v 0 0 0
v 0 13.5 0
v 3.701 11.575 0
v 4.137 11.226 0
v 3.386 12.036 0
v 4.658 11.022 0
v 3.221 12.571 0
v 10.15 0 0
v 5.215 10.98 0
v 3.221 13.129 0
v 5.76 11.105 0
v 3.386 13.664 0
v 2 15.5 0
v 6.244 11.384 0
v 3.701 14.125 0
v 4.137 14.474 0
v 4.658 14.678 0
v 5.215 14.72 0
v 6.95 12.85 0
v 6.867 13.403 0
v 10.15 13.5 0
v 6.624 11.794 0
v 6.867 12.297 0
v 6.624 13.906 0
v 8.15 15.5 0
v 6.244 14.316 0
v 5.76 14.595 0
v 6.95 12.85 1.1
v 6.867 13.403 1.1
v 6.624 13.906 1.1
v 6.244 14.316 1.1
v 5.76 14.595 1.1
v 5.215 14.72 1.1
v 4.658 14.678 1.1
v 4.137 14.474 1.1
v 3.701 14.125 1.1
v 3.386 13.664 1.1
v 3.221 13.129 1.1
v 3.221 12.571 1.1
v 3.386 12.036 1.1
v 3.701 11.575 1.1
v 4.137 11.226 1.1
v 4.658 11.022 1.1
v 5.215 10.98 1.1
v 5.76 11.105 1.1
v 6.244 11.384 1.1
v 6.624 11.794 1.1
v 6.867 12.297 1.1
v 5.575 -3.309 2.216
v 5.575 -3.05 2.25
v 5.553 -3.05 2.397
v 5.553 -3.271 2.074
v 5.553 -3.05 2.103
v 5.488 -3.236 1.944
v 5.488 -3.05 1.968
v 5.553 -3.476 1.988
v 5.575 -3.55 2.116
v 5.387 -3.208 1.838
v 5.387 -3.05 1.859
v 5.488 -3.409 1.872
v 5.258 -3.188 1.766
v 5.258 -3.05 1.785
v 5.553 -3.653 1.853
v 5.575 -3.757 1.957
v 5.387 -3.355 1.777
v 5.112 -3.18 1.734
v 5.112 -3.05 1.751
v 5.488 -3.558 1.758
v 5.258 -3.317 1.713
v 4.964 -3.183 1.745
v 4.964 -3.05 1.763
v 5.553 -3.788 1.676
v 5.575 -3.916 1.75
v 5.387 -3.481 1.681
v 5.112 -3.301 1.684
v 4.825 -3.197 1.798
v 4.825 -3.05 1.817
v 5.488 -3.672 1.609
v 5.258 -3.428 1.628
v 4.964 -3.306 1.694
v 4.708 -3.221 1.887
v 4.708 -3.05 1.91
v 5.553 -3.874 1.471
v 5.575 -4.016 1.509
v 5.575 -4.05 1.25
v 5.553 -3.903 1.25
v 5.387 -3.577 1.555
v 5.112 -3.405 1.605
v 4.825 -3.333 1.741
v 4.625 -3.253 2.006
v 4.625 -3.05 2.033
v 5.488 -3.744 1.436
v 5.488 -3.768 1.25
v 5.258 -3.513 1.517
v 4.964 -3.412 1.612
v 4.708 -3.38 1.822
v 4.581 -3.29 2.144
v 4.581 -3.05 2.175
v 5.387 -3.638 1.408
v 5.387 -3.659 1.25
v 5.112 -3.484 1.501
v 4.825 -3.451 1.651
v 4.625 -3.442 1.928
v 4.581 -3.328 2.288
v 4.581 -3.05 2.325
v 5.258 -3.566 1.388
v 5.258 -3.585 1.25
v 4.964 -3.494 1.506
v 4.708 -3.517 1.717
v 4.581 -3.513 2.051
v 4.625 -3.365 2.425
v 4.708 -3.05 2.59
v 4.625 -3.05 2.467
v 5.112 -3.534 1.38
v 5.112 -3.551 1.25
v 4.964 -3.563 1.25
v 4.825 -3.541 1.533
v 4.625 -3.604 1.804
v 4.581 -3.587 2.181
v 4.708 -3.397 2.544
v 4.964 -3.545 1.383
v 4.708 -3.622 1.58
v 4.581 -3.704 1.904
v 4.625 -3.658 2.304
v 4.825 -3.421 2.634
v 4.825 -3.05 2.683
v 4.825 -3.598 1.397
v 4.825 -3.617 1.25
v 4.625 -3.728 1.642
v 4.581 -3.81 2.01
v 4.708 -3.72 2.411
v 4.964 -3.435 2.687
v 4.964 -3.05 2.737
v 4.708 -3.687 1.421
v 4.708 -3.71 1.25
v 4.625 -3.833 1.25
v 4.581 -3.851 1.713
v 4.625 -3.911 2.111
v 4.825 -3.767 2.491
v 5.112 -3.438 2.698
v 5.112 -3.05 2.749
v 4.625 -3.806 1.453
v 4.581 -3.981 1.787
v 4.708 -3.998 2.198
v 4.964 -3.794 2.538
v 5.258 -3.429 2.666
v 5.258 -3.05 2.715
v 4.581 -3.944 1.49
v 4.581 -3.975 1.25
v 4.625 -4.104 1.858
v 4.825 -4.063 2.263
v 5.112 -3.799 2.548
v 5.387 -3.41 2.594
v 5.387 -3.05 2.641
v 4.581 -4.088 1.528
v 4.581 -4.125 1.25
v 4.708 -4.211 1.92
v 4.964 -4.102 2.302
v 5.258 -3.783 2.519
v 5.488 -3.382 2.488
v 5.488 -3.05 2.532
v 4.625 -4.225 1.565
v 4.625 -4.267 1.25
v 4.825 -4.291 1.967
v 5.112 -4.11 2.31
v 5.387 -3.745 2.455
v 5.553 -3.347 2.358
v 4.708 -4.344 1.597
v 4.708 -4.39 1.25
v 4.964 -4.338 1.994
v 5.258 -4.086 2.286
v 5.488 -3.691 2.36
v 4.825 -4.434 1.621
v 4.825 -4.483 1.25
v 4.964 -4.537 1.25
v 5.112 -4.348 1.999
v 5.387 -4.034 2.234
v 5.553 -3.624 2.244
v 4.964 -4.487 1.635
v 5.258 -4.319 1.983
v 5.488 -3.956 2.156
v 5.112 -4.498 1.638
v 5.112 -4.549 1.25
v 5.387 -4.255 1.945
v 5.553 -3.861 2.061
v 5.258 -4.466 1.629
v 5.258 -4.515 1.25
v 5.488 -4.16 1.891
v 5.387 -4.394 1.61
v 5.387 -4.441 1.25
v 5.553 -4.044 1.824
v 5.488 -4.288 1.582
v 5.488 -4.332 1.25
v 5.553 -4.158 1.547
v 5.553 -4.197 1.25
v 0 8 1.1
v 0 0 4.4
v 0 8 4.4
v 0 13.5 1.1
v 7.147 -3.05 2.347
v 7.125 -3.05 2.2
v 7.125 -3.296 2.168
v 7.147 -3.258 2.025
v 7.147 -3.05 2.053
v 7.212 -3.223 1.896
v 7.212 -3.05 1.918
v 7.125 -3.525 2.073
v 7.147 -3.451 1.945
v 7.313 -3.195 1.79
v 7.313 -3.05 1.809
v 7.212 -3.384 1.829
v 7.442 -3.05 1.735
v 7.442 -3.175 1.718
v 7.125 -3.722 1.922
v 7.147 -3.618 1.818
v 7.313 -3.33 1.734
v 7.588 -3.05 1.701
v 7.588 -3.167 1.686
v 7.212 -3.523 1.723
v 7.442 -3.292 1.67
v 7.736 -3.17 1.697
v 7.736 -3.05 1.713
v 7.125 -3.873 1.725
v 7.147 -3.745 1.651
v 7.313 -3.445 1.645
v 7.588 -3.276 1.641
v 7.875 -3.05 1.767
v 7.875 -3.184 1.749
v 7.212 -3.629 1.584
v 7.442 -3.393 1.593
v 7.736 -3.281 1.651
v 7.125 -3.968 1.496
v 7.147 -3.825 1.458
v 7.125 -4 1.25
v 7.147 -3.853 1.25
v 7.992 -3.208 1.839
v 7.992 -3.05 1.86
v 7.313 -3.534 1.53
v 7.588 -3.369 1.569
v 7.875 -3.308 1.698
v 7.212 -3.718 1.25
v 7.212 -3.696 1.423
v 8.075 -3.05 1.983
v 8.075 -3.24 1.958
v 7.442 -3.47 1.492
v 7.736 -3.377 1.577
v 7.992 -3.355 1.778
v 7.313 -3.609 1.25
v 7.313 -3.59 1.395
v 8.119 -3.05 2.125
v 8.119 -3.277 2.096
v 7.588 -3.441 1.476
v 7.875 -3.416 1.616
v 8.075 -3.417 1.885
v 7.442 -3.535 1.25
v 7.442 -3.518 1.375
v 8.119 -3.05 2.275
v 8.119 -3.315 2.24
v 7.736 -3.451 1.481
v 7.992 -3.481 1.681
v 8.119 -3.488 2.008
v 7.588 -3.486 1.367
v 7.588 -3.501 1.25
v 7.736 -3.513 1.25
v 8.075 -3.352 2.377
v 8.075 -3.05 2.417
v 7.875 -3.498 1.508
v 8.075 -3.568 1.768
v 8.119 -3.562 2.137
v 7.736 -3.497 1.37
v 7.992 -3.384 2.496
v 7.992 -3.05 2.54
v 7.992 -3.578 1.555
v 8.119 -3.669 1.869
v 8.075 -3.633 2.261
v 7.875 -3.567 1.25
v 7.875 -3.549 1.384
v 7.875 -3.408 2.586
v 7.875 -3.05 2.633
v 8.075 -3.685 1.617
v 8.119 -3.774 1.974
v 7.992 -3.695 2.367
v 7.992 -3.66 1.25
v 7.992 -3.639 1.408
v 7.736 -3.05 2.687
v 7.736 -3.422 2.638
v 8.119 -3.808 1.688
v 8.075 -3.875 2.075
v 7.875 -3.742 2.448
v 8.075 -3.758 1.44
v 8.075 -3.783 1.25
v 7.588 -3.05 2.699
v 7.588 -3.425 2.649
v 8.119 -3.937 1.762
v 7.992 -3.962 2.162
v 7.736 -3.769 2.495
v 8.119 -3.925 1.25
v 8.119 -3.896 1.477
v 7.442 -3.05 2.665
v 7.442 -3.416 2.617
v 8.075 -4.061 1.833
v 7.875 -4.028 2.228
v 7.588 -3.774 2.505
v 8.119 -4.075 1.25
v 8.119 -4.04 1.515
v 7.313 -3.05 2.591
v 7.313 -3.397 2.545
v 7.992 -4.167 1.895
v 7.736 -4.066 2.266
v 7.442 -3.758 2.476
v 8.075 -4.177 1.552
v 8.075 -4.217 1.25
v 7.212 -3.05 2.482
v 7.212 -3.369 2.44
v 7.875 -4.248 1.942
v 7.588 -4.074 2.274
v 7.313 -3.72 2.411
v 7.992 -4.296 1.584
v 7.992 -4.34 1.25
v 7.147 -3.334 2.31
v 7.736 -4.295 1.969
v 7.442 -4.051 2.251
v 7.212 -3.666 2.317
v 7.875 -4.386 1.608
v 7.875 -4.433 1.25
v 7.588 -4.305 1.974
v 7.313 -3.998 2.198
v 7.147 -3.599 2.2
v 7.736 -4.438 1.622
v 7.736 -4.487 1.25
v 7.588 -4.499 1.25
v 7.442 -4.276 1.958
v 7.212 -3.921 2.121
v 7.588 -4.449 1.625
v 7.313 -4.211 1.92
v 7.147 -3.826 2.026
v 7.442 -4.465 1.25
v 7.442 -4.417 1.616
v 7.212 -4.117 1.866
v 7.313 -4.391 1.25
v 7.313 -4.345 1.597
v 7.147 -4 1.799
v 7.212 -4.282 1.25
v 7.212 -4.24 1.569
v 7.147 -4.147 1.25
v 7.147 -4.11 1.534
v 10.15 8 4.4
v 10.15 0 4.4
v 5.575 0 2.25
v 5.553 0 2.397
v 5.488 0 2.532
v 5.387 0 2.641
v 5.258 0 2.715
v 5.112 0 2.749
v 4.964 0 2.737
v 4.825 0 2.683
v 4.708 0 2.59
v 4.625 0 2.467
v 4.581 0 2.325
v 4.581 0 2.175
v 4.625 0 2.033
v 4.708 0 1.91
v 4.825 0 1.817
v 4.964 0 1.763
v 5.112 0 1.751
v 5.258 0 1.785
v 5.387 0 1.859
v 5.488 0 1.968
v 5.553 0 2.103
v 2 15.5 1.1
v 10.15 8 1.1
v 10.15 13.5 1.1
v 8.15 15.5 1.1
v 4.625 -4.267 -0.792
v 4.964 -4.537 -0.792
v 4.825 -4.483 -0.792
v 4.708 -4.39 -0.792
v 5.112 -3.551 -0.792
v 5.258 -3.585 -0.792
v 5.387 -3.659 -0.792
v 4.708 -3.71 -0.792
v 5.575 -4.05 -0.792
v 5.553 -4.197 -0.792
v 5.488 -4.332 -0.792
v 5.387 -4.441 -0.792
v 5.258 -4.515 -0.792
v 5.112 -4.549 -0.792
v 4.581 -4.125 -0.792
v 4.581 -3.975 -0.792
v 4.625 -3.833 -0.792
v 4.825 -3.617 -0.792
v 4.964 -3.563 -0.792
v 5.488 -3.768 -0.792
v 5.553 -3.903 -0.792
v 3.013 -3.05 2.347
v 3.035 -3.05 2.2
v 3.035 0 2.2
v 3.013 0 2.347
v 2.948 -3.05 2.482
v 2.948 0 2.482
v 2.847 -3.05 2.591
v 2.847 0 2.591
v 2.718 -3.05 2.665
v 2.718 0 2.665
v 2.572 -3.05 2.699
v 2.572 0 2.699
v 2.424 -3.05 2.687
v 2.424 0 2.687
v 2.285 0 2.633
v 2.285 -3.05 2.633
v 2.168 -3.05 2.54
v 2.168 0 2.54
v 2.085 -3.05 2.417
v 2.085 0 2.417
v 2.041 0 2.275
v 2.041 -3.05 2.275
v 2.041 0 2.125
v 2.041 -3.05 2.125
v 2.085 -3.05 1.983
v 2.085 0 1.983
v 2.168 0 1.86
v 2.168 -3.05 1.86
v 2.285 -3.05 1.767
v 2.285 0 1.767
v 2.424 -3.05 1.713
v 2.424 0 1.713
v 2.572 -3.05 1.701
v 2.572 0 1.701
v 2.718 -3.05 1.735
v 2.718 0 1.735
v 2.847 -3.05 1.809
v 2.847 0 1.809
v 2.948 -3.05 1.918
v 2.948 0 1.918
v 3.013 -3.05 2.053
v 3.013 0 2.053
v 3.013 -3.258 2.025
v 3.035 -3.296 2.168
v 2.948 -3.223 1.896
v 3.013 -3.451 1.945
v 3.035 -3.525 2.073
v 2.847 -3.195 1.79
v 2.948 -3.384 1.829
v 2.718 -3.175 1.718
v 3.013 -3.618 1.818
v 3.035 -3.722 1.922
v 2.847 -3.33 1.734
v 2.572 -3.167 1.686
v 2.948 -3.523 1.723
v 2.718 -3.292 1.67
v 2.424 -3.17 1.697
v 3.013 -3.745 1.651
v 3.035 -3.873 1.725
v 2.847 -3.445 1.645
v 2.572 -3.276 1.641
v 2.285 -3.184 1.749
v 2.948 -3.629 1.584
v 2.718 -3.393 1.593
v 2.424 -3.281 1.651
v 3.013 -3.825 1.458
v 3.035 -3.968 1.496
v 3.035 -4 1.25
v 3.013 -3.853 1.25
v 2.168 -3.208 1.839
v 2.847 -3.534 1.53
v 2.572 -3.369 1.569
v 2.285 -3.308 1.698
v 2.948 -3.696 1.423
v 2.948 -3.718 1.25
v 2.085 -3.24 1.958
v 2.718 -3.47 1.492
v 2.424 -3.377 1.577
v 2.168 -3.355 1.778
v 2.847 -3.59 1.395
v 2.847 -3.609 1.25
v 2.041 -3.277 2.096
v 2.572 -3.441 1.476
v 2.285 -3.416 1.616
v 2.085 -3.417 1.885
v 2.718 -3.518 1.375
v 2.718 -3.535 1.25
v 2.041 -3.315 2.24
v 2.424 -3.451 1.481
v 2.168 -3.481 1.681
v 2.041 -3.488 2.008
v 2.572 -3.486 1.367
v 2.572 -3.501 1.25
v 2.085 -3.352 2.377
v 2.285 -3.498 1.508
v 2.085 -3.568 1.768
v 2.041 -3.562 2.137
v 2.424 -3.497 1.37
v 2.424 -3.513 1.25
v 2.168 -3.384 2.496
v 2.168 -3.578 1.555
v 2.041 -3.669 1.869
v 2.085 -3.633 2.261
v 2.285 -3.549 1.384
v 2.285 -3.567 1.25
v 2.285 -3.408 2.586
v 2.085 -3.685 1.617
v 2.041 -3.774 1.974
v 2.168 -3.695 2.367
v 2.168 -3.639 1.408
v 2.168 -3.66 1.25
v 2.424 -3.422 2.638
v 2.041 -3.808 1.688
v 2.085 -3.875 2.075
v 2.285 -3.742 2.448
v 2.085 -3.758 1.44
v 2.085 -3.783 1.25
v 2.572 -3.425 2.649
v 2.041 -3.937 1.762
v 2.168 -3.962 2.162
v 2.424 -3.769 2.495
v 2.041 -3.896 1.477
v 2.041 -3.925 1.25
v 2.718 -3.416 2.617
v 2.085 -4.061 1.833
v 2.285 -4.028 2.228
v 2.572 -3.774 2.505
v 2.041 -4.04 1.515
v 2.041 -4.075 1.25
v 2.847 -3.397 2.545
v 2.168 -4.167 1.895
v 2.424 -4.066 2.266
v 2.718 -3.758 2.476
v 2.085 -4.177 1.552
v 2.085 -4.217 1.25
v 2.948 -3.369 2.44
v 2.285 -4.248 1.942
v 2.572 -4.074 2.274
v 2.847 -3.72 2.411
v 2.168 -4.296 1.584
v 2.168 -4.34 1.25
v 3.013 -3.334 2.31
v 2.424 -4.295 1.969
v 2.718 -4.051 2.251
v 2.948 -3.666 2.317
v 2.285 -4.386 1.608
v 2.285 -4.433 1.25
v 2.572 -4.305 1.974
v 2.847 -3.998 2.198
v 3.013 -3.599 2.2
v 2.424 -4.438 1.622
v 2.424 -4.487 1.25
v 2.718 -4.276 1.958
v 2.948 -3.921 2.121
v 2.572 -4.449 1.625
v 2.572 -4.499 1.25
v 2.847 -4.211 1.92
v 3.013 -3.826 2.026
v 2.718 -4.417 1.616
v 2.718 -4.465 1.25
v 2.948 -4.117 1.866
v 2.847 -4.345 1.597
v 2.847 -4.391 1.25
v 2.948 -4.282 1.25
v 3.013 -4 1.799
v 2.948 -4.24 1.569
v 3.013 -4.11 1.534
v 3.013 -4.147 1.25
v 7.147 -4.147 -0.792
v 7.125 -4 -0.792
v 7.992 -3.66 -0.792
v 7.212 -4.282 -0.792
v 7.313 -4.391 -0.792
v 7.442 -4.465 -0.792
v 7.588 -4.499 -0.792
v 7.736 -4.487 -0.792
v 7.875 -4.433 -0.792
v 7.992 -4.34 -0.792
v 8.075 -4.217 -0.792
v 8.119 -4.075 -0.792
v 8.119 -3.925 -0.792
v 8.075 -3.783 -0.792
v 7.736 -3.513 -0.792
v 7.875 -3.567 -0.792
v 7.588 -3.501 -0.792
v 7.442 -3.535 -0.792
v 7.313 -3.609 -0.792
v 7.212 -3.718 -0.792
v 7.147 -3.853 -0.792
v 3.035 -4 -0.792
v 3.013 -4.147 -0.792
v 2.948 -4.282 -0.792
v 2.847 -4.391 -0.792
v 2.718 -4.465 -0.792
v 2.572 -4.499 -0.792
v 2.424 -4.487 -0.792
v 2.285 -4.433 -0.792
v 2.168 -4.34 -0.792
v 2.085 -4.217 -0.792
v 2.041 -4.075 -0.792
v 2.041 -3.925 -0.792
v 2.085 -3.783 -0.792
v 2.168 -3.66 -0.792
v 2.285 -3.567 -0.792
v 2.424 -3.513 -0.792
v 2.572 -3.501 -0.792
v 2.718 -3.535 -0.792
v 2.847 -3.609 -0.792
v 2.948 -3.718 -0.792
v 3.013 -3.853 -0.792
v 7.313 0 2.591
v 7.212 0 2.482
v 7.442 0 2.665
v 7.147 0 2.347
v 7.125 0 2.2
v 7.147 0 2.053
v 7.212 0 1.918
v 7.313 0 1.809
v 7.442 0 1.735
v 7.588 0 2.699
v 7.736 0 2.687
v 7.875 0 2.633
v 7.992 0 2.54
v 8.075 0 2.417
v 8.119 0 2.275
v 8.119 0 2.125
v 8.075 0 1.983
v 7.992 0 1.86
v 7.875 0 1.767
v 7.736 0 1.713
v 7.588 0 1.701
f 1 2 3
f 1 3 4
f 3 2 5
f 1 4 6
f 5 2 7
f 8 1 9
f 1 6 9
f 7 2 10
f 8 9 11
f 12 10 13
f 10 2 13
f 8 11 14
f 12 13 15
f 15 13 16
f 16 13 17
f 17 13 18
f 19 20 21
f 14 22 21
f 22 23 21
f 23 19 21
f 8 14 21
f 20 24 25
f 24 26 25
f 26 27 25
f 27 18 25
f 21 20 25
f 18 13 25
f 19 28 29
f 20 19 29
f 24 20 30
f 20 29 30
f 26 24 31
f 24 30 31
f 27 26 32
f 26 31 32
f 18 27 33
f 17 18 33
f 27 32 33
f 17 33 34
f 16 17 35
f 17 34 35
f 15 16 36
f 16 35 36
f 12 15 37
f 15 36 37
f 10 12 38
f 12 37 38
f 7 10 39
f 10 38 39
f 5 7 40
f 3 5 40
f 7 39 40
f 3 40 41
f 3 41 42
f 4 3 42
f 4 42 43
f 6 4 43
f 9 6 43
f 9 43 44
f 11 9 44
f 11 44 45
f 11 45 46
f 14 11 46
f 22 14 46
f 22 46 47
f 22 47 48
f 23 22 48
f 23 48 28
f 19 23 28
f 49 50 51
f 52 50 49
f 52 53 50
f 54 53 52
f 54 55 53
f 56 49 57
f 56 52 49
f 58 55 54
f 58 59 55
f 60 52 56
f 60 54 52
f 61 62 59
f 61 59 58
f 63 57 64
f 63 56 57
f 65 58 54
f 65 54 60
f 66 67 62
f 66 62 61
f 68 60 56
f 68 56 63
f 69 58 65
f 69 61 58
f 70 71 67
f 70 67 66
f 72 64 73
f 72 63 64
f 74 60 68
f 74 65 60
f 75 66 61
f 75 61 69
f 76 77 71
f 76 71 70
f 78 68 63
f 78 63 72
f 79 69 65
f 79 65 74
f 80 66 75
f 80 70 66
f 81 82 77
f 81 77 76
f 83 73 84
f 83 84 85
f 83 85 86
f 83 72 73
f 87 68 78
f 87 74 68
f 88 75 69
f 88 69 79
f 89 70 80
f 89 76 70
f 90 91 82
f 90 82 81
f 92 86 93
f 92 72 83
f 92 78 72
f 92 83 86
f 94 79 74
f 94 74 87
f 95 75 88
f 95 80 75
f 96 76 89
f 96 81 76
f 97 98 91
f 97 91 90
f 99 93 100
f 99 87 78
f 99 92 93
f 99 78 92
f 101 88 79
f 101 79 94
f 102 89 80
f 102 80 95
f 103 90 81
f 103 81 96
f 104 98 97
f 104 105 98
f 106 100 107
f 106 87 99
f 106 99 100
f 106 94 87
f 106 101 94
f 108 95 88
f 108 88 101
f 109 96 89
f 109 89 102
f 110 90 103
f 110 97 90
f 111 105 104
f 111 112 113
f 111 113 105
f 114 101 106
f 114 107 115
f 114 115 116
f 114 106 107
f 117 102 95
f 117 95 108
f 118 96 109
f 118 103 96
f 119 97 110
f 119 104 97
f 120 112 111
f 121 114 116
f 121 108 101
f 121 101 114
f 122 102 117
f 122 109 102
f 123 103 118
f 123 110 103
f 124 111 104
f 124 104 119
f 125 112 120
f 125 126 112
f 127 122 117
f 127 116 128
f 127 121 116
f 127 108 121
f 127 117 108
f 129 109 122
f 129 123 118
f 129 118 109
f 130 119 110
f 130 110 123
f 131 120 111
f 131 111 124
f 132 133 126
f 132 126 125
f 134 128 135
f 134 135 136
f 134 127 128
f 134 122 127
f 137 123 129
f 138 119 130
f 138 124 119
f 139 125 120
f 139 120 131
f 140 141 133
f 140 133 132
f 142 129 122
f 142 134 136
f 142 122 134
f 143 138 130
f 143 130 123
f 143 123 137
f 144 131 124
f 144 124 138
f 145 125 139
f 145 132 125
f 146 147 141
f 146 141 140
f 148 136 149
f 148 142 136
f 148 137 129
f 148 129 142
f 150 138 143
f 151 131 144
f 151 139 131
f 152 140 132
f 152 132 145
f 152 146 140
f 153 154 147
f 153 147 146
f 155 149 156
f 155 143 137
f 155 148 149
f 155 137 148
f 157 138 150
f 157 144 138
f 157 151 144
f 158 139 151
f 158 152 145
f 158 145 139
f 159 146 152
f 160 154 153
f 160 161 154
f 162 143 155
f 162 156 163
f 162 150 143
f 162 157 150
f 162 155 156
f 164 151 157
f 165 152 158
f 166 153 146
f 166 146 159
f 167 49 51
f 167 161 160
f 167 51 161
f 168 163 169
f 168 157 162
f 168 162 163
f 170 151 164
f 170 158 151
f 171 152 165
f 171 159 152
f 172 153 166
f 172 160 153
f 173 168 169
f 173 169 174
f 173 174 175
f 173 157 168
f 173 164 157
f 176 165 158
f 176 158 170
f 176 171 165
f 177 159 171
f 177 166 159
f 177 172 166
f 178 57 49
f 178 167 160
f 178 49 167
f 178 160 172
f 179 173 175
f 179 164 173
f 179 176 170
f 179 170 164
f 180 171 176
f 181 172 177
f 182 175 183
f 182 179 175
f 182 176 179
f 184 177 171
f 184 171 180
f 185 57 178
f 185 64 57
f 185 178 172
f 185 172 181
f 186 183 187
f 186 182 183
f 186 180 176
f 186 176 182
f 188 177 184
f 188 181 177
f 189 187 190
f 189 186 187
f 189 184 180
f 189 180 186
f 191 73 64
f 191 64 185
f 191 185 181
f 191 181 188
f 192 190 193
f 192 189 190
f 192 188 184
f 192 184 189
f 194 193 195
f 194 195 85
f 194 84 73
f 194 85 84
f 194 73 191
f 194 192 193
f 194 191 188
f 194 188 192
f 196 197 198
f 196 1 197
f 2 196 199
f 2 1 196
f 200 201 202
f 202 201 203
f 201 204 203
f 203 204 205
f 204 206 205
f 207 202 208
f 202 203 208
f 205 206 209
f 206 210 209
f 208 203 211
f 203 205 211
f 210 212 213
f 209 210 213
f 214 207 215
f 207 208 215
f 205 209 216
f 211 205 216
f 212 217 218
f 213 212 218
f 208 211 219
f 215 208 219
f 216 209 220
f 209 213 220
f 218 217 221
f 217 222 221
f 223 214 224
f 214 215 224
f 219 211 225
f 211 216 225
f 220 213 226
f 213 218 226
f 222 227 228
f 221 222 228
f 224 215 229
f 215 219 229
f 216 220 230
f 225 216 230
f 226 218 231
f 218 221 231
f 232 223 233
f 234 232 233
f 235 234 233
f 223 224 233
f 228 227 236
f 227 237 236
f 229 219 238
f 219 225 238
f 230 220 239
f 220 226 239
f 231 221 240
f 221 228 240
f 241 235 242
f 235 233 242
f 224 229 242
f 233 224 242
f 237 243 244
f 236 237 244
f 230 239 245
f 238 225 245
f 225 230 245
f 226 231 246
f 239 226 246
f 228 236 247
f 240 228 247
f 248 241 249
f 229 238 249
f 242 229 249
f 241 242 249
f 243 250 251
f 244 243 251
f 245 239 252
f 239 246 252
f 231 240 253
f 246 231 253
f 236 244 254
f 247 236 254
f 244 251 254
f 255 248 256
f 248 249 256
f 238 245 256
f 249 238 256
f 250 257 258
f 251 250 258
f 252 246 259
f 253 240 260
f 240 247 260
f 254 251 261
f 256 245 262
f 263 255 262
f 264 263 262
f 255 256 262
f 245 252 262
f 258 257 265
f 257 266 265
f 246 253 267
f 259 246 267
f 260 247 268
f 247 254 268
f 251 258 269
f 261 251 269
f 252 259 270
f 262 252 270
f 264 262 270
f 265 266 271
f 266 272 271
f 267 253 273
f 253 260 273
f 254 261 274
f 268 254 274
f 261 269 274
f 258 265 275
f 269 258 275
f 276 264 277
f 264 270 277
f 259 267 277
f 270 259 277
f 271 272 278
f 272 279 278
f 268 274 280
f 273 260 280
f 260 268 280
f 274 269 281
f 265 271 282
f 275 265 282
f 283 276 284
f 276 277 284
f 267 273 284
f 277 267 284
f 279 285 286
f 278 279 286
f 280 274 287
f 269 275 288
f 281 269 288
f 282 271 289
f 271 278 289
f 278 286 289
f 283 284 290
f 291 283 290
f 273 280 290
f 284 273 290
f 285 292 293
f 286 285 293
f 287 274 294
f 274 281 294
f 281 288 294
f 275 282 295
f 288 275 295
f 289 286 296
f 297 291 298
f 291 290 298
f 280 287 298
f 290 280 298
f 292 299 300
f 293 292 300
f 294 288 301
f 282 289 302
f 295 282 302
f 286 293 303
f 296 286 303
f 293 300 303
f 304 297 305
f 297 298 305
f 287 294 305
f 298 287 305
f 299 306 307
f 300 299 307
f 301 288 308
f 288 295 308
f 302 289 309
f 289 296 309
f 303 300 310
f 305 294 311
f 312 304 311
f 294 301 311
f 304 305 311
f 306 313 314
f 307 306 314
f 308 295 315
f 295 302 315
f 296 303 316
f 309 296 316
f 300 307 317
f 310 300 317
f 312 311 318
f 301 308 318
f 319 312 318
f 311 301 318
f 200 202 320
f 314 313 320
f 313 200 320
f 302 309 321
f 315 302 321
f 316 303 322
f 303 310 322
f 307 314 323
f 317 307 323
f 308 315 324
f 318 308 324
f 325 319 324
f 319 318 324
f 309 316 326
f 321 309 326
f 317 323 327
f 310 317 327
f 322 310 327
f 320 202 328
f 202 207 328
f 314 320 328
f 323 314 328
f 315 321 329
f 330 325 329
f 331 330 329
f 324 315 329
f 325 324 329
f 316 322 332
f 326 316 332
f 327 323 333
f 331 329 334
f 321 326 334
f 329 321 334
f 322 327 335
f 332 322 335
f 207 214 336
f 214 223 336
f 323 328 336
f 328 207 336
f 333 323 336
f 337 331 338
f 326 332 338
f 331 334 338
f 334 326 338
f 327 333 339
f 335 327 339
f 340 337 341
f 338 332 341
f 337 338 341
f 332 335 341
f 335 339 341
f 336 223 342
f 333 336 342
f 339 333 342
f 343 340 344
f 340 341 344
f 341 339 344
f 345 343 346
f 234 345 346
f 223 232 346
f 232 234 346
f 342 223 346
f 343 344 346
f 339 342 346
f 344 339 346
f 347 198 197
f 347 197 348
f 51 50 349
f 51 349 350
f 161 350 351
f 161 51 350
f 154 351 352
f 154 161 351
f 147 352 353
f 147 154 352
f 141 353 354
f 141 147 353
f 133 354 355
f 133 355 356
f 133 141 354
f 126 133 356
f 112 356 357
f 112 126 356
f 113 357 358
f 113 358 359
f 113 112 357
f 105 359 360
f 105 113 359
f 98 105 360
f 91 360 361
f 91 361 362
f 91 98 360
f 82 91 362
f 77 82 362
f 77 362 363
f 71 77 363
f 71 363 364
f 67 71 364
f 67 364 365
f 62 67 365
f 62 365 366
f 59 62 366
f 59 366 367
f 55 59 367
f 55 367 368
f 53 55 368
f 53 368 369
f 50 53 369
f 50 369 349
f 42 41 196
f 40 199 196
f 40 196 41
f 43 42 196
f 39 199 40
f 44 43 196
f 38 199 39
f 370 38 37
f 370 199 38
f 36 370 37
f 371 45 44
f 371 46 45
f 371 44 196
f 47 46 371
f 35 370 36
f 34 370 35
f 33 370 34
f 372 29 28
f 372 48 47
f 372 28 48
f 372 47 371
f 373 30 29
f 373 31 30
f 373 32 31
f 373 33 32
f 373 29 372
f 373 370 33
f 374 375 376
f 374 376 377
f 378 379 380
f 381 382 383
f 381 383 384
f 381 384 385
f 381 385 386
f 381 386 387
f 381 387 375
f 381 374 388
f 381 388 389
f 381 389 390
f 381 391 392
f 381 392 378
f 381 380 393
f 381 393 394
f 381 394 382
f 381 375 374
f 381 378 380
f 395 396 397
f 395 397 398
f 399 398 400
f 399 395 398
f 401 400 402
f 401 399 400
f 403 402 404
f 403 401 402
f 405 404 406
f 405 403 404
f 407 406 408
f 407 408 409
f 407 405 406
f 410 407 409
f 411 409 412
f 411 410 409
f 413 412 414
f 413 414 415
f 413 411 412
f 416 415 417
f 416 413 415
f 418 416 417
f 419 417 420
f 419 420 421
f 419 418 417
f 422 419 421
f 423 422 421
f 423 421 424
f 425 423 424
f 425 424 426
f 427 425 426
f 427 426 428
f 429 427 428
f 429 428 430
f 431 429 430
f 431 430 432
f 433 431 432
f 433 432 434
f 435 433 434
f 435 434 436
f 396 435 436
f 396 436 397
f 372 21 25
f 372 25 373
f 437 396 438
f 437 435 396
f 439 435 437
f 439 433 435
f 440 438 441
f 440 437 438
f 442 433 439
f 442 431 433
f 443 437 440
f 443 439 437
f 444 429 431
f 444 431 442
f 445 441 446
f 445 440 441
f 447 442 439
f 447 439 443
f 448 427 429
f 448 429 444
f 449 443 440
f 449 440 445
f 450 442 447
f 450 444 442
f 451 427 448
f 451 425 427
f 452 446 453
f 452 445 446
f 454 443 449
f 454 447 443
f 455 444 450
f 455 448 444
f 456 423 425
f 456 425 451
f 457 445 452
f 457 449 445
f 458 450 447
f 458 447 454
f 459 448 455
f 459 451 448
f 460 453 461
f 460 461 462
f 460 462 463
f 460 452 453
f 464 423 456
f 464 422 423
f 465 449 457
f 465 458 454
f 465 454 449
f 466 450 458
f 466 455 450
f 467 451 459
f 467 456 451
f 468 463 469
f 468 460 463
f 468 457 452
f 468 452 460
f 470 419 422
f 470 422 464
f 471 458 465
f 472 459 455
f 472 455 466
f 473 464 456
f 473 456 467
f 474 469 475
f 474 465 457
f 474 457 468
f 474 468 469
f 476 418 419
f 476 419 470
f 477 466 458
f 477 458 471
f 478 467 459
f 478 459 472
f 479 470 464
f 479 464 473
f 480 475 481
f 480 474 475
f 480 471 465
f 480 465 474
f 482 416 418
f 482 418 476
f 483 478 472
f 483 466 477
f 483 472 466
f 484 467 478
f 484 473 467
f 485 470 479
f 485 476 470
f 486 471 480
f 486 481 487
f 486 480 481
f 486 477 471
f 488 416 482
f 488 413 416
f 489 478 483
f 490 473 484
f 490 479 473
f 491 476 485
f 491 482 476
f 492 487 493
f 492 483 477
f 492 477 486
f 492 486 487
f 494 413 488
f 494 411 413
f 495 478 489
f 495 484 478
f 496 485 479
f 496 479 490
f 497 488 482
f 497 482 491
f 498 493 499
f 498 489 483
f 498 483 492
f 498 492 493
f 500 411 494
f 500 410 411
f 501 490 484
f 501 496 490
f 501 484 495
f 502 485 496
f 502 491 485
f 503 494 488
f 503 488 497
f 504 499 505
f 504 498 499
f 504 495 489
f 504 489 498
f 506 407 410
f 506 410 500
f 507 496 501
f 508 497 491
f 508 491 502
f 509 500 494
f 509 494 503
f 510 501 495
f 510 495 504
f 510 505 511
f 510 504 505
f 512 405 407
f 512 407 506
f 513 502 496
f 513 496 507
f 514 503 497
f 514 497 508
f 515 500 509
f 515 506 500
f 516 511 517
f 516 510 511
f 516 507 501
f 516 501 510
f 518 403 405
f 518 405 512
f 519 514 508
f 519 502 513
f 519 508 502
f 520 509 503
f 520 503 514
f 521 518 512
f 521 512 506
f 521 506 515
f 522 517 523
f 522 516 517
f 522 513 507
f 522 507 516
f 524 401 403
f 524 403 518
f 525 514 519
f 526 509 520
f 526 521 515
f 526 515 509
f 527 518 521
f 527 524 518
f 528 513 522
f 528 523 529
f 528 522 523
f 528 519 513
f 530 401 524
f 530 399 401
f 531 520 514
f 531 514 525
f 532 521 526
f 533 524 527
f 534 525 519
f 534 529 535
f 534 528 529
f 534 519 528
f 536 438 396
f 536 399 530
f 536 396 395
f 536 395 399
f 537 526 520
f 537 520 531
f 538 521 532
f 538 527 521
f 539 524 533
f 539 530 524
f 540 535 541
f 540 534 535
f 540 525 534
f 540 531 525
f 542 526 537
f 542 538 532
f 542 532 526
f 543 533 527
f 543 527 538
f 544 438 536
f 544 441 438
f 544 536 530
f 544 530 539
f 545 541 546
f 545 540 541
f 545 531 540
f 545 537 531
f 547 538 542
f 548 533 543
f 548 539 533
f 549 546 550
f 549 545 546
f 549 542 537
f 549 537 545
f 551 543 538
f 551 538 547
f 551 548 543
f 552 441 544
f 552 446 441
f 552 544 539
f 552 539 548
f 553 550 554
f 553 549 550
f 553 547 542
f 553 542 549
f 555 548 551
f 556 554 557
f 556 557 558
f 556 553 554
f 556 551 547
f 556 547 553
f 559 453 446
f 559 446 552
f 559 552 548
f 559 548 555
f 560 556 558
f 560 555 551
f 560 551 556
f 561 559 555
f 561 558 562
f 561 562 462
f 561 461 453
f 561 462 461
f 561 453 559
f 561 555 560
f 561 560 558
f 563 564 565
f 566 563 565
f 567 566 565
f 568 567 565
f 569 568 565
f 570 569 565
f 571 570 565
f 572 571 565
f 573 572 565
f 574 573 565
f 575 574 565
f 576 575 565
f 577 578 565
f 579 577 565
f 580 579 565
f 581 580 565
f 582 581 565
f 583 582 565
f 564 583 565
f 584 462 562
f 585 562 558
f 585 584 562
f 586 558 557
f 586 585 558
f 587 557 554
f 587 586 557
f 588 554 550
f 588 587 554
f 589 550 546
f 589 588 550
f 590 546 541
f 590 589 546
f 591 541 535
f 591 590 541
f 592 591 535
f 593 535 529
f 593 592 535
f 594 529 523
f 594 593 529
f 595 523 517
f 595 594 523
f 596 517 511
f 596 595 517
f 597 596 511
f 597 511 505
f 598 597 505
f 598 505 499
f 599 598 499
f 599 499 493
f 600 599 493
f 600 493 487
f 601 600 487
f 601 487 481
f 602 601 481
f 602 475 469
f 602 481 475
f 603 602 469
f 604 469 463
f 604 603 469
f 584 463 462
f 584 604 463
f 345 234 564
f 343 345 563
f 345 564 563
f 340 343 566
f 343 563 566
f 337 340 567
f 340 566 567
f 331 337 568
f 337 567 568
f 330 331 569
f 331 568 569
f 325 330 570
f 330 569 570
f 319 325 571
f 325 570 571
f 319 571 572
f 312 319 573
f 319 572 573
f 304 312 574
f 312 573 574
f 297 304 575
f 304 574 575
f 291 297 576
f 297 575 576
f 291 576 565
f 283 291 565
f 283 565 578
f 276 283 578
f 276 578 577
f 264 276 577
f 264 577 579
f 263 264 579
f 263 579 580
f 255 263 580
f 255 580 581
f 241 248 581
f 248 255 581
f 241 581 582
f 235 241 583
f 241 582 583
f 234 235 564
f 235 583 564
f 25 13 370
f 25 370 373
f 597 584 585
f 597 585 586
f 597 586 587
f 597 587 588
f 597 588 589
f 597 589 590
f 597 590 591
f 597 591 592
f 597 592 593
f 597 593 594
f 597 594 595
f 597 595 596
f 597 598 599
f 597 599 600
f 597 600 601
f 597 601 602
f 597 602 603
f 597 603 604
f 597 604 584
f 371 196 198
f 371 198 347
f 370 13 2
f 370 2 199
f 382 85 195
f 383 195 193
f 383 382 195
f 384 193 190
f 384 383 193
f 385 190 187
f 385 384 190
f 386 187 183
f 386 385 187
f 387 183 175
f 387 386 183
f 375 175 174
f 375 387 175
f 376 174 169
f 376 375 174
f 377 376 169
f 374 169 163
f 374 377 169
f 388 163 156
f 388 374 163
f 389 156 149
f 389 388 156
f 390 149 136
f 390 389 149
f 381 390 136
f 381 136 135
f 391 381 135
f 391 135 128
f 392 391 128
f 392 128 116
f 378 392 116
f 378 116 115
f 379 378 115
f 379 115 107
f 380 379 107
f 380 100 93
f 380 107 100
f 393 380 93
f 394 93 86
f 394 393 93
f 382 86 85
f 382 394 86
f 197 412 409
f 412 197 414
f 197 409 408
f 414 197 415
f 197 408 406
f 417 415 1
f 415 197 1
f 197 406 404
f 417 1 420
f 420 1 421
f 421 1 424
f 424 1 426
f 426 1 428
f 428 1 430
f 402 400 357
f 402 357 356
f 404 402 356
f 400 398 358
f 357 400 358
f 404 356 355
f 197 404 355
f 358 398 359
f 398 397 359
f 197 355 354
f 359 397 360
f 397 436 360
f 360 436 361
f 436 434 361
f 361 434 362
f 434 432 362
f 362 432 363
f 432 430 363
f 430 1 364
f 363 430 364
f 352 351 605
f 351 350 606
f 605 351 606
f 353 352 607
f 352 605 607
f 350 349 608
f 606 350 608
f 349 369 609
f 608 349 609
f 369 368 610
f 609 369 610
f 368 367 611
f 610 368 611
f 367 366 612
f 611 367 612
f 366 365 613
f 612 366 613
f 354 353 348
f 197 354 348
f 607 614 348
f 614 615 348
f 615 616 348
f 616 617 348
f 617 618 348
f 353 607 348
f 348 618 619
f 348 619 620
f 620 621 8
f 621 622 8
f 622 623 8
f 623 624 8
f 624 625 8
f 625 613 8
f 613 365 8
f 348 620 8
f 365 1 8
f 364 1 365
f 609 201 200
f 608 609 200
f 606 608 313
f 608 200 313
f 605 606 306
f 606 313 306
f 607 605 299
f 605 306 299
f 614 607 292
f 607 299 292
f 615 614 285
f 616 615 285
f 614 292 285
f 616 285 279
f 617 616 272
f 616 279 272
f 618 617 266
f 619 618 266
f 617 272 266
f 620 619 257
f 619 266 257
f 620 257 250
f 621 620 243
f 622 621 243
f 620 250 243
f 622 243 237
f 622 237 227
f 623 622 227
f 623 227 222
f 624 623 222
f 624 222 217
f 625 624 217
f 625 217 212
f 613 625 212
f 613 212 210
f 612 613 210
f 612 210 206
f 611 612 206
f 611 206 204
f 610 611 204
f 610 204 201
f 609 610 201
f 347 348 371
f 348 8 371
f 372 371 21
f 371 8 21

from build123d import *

# Parameters (mm, degrees)
ESQUISSE1_W             = 10.15
ESQUISSE1_H             = 15.5
EXTRUSION1_DEPTH        = 1.1
ESQUISSE2_R             = 1.875
ENL_V_MAT_EXTRU_1_DEPTH = 19.560239761
CHANFREIN1_SIZE         = 2
ESQUISSE3_W             = 10.15
ESQUISSE3_H             = 8
EXTRUSION2_DEPTH        = 3.3
ESQUISSE5_R             = 0.5
ESQUISSE9_R             = 0.5


with BuildPart() as part:
    # Esquisse1 → Extrusion1 (new body)
    with BuildSketch(Plane.XY):
        with Locations((5.075, 7.75)):
            Rectangle(ESQUISSE1_W, ESQUISSE1_H)
    extrude(amount=EXTRUSION1_DEPTH)

    # Esquisse2 → Enlèv. mat.-Extru.1 (cut, through all)
    with BuildSketch(Plane.XY.offset(1.1)):
        with Locations((5.075, 12.85)):
            Circle(ESQUISSE2_R)
    extrude(amount=-ENL_V_MAT_EXTRU_1_DEPTH, mode=Mode.SUBTRACT)

    # Chanfrein1
    chanfrein1_edges = [part.edges().sort_by_distance(p)[0] for p in [
        (0, 15.5, 0.55),
        (10.15, 15.5, 0.55),
    ]]
    chamfer(chanfrein1_edges, length=CHANFREIN1_SIZE)

    # Esquisse3 → Extrusion2 (add)
    with BuildSketch(Plane.XY.offset(1.1)):
        with Locations((5.075, 4)):
            Rectangle(ESQUISSE3_W, ESQUISSE3_H)
    extrude(amount=EXTRUSION2_DEPTH)

    # Balayage1: sweep along a path in Esquisse8
    with BuildLine(Plane(origin=(2.54, 0, 0), x_dir=(0, 0, -1), z_dir=(1, 0, 0))) as balayage1_path:
        Line((-2.25, 0), (-2.25, -3.05))
        ThreePointArc((-2.25, -3.05), (-1.957106781, -3.757106781), (-1.25, -4.05))
        Line((-1.25, -4.05), (0.791981695, -4.05))
    # Esquisse5 → Balayage1 (sweep)
    with BuildSketch(Plane.XZ):
        with Locations((2.535, 2.2)):
            Circle(ESQUISSE5_R)
    balayage1 = sweep(path=balayage1_path.line)

    # Balayage2: sweep along a path in Esquisse10
    with BuildLine(Plane(origin=(5.08, 0, 0), x_dir=(0, 0, -1), z_dir=(1, 0, 0))) as balayage2_path:
        Line((-2.25, 0), (-2.25, -3.05))
        ThreePointArc((-2.25, -3.05), (-1.957106781, -3.757106781), (-1.25, -4.05))
        Line((-1.25, -4.05), (0.791981695, -4.05))
    # Esquisse9 → Balayage2 (sweep)
    with BuildSketch(Plane.XZ):
        with Locations((5.075, 2.25)):
            Circle(ESQUISSE9_R)
    sweep(path=balayage2_path.line)

    # Symétrie1: Balayage1 across plane
    add(balayage1.mirror(Plane(origin=(5.08, 0, 0), x_dir=(0, 0, 1), z_dir=(1, 0, 0))))


solid = part.part
